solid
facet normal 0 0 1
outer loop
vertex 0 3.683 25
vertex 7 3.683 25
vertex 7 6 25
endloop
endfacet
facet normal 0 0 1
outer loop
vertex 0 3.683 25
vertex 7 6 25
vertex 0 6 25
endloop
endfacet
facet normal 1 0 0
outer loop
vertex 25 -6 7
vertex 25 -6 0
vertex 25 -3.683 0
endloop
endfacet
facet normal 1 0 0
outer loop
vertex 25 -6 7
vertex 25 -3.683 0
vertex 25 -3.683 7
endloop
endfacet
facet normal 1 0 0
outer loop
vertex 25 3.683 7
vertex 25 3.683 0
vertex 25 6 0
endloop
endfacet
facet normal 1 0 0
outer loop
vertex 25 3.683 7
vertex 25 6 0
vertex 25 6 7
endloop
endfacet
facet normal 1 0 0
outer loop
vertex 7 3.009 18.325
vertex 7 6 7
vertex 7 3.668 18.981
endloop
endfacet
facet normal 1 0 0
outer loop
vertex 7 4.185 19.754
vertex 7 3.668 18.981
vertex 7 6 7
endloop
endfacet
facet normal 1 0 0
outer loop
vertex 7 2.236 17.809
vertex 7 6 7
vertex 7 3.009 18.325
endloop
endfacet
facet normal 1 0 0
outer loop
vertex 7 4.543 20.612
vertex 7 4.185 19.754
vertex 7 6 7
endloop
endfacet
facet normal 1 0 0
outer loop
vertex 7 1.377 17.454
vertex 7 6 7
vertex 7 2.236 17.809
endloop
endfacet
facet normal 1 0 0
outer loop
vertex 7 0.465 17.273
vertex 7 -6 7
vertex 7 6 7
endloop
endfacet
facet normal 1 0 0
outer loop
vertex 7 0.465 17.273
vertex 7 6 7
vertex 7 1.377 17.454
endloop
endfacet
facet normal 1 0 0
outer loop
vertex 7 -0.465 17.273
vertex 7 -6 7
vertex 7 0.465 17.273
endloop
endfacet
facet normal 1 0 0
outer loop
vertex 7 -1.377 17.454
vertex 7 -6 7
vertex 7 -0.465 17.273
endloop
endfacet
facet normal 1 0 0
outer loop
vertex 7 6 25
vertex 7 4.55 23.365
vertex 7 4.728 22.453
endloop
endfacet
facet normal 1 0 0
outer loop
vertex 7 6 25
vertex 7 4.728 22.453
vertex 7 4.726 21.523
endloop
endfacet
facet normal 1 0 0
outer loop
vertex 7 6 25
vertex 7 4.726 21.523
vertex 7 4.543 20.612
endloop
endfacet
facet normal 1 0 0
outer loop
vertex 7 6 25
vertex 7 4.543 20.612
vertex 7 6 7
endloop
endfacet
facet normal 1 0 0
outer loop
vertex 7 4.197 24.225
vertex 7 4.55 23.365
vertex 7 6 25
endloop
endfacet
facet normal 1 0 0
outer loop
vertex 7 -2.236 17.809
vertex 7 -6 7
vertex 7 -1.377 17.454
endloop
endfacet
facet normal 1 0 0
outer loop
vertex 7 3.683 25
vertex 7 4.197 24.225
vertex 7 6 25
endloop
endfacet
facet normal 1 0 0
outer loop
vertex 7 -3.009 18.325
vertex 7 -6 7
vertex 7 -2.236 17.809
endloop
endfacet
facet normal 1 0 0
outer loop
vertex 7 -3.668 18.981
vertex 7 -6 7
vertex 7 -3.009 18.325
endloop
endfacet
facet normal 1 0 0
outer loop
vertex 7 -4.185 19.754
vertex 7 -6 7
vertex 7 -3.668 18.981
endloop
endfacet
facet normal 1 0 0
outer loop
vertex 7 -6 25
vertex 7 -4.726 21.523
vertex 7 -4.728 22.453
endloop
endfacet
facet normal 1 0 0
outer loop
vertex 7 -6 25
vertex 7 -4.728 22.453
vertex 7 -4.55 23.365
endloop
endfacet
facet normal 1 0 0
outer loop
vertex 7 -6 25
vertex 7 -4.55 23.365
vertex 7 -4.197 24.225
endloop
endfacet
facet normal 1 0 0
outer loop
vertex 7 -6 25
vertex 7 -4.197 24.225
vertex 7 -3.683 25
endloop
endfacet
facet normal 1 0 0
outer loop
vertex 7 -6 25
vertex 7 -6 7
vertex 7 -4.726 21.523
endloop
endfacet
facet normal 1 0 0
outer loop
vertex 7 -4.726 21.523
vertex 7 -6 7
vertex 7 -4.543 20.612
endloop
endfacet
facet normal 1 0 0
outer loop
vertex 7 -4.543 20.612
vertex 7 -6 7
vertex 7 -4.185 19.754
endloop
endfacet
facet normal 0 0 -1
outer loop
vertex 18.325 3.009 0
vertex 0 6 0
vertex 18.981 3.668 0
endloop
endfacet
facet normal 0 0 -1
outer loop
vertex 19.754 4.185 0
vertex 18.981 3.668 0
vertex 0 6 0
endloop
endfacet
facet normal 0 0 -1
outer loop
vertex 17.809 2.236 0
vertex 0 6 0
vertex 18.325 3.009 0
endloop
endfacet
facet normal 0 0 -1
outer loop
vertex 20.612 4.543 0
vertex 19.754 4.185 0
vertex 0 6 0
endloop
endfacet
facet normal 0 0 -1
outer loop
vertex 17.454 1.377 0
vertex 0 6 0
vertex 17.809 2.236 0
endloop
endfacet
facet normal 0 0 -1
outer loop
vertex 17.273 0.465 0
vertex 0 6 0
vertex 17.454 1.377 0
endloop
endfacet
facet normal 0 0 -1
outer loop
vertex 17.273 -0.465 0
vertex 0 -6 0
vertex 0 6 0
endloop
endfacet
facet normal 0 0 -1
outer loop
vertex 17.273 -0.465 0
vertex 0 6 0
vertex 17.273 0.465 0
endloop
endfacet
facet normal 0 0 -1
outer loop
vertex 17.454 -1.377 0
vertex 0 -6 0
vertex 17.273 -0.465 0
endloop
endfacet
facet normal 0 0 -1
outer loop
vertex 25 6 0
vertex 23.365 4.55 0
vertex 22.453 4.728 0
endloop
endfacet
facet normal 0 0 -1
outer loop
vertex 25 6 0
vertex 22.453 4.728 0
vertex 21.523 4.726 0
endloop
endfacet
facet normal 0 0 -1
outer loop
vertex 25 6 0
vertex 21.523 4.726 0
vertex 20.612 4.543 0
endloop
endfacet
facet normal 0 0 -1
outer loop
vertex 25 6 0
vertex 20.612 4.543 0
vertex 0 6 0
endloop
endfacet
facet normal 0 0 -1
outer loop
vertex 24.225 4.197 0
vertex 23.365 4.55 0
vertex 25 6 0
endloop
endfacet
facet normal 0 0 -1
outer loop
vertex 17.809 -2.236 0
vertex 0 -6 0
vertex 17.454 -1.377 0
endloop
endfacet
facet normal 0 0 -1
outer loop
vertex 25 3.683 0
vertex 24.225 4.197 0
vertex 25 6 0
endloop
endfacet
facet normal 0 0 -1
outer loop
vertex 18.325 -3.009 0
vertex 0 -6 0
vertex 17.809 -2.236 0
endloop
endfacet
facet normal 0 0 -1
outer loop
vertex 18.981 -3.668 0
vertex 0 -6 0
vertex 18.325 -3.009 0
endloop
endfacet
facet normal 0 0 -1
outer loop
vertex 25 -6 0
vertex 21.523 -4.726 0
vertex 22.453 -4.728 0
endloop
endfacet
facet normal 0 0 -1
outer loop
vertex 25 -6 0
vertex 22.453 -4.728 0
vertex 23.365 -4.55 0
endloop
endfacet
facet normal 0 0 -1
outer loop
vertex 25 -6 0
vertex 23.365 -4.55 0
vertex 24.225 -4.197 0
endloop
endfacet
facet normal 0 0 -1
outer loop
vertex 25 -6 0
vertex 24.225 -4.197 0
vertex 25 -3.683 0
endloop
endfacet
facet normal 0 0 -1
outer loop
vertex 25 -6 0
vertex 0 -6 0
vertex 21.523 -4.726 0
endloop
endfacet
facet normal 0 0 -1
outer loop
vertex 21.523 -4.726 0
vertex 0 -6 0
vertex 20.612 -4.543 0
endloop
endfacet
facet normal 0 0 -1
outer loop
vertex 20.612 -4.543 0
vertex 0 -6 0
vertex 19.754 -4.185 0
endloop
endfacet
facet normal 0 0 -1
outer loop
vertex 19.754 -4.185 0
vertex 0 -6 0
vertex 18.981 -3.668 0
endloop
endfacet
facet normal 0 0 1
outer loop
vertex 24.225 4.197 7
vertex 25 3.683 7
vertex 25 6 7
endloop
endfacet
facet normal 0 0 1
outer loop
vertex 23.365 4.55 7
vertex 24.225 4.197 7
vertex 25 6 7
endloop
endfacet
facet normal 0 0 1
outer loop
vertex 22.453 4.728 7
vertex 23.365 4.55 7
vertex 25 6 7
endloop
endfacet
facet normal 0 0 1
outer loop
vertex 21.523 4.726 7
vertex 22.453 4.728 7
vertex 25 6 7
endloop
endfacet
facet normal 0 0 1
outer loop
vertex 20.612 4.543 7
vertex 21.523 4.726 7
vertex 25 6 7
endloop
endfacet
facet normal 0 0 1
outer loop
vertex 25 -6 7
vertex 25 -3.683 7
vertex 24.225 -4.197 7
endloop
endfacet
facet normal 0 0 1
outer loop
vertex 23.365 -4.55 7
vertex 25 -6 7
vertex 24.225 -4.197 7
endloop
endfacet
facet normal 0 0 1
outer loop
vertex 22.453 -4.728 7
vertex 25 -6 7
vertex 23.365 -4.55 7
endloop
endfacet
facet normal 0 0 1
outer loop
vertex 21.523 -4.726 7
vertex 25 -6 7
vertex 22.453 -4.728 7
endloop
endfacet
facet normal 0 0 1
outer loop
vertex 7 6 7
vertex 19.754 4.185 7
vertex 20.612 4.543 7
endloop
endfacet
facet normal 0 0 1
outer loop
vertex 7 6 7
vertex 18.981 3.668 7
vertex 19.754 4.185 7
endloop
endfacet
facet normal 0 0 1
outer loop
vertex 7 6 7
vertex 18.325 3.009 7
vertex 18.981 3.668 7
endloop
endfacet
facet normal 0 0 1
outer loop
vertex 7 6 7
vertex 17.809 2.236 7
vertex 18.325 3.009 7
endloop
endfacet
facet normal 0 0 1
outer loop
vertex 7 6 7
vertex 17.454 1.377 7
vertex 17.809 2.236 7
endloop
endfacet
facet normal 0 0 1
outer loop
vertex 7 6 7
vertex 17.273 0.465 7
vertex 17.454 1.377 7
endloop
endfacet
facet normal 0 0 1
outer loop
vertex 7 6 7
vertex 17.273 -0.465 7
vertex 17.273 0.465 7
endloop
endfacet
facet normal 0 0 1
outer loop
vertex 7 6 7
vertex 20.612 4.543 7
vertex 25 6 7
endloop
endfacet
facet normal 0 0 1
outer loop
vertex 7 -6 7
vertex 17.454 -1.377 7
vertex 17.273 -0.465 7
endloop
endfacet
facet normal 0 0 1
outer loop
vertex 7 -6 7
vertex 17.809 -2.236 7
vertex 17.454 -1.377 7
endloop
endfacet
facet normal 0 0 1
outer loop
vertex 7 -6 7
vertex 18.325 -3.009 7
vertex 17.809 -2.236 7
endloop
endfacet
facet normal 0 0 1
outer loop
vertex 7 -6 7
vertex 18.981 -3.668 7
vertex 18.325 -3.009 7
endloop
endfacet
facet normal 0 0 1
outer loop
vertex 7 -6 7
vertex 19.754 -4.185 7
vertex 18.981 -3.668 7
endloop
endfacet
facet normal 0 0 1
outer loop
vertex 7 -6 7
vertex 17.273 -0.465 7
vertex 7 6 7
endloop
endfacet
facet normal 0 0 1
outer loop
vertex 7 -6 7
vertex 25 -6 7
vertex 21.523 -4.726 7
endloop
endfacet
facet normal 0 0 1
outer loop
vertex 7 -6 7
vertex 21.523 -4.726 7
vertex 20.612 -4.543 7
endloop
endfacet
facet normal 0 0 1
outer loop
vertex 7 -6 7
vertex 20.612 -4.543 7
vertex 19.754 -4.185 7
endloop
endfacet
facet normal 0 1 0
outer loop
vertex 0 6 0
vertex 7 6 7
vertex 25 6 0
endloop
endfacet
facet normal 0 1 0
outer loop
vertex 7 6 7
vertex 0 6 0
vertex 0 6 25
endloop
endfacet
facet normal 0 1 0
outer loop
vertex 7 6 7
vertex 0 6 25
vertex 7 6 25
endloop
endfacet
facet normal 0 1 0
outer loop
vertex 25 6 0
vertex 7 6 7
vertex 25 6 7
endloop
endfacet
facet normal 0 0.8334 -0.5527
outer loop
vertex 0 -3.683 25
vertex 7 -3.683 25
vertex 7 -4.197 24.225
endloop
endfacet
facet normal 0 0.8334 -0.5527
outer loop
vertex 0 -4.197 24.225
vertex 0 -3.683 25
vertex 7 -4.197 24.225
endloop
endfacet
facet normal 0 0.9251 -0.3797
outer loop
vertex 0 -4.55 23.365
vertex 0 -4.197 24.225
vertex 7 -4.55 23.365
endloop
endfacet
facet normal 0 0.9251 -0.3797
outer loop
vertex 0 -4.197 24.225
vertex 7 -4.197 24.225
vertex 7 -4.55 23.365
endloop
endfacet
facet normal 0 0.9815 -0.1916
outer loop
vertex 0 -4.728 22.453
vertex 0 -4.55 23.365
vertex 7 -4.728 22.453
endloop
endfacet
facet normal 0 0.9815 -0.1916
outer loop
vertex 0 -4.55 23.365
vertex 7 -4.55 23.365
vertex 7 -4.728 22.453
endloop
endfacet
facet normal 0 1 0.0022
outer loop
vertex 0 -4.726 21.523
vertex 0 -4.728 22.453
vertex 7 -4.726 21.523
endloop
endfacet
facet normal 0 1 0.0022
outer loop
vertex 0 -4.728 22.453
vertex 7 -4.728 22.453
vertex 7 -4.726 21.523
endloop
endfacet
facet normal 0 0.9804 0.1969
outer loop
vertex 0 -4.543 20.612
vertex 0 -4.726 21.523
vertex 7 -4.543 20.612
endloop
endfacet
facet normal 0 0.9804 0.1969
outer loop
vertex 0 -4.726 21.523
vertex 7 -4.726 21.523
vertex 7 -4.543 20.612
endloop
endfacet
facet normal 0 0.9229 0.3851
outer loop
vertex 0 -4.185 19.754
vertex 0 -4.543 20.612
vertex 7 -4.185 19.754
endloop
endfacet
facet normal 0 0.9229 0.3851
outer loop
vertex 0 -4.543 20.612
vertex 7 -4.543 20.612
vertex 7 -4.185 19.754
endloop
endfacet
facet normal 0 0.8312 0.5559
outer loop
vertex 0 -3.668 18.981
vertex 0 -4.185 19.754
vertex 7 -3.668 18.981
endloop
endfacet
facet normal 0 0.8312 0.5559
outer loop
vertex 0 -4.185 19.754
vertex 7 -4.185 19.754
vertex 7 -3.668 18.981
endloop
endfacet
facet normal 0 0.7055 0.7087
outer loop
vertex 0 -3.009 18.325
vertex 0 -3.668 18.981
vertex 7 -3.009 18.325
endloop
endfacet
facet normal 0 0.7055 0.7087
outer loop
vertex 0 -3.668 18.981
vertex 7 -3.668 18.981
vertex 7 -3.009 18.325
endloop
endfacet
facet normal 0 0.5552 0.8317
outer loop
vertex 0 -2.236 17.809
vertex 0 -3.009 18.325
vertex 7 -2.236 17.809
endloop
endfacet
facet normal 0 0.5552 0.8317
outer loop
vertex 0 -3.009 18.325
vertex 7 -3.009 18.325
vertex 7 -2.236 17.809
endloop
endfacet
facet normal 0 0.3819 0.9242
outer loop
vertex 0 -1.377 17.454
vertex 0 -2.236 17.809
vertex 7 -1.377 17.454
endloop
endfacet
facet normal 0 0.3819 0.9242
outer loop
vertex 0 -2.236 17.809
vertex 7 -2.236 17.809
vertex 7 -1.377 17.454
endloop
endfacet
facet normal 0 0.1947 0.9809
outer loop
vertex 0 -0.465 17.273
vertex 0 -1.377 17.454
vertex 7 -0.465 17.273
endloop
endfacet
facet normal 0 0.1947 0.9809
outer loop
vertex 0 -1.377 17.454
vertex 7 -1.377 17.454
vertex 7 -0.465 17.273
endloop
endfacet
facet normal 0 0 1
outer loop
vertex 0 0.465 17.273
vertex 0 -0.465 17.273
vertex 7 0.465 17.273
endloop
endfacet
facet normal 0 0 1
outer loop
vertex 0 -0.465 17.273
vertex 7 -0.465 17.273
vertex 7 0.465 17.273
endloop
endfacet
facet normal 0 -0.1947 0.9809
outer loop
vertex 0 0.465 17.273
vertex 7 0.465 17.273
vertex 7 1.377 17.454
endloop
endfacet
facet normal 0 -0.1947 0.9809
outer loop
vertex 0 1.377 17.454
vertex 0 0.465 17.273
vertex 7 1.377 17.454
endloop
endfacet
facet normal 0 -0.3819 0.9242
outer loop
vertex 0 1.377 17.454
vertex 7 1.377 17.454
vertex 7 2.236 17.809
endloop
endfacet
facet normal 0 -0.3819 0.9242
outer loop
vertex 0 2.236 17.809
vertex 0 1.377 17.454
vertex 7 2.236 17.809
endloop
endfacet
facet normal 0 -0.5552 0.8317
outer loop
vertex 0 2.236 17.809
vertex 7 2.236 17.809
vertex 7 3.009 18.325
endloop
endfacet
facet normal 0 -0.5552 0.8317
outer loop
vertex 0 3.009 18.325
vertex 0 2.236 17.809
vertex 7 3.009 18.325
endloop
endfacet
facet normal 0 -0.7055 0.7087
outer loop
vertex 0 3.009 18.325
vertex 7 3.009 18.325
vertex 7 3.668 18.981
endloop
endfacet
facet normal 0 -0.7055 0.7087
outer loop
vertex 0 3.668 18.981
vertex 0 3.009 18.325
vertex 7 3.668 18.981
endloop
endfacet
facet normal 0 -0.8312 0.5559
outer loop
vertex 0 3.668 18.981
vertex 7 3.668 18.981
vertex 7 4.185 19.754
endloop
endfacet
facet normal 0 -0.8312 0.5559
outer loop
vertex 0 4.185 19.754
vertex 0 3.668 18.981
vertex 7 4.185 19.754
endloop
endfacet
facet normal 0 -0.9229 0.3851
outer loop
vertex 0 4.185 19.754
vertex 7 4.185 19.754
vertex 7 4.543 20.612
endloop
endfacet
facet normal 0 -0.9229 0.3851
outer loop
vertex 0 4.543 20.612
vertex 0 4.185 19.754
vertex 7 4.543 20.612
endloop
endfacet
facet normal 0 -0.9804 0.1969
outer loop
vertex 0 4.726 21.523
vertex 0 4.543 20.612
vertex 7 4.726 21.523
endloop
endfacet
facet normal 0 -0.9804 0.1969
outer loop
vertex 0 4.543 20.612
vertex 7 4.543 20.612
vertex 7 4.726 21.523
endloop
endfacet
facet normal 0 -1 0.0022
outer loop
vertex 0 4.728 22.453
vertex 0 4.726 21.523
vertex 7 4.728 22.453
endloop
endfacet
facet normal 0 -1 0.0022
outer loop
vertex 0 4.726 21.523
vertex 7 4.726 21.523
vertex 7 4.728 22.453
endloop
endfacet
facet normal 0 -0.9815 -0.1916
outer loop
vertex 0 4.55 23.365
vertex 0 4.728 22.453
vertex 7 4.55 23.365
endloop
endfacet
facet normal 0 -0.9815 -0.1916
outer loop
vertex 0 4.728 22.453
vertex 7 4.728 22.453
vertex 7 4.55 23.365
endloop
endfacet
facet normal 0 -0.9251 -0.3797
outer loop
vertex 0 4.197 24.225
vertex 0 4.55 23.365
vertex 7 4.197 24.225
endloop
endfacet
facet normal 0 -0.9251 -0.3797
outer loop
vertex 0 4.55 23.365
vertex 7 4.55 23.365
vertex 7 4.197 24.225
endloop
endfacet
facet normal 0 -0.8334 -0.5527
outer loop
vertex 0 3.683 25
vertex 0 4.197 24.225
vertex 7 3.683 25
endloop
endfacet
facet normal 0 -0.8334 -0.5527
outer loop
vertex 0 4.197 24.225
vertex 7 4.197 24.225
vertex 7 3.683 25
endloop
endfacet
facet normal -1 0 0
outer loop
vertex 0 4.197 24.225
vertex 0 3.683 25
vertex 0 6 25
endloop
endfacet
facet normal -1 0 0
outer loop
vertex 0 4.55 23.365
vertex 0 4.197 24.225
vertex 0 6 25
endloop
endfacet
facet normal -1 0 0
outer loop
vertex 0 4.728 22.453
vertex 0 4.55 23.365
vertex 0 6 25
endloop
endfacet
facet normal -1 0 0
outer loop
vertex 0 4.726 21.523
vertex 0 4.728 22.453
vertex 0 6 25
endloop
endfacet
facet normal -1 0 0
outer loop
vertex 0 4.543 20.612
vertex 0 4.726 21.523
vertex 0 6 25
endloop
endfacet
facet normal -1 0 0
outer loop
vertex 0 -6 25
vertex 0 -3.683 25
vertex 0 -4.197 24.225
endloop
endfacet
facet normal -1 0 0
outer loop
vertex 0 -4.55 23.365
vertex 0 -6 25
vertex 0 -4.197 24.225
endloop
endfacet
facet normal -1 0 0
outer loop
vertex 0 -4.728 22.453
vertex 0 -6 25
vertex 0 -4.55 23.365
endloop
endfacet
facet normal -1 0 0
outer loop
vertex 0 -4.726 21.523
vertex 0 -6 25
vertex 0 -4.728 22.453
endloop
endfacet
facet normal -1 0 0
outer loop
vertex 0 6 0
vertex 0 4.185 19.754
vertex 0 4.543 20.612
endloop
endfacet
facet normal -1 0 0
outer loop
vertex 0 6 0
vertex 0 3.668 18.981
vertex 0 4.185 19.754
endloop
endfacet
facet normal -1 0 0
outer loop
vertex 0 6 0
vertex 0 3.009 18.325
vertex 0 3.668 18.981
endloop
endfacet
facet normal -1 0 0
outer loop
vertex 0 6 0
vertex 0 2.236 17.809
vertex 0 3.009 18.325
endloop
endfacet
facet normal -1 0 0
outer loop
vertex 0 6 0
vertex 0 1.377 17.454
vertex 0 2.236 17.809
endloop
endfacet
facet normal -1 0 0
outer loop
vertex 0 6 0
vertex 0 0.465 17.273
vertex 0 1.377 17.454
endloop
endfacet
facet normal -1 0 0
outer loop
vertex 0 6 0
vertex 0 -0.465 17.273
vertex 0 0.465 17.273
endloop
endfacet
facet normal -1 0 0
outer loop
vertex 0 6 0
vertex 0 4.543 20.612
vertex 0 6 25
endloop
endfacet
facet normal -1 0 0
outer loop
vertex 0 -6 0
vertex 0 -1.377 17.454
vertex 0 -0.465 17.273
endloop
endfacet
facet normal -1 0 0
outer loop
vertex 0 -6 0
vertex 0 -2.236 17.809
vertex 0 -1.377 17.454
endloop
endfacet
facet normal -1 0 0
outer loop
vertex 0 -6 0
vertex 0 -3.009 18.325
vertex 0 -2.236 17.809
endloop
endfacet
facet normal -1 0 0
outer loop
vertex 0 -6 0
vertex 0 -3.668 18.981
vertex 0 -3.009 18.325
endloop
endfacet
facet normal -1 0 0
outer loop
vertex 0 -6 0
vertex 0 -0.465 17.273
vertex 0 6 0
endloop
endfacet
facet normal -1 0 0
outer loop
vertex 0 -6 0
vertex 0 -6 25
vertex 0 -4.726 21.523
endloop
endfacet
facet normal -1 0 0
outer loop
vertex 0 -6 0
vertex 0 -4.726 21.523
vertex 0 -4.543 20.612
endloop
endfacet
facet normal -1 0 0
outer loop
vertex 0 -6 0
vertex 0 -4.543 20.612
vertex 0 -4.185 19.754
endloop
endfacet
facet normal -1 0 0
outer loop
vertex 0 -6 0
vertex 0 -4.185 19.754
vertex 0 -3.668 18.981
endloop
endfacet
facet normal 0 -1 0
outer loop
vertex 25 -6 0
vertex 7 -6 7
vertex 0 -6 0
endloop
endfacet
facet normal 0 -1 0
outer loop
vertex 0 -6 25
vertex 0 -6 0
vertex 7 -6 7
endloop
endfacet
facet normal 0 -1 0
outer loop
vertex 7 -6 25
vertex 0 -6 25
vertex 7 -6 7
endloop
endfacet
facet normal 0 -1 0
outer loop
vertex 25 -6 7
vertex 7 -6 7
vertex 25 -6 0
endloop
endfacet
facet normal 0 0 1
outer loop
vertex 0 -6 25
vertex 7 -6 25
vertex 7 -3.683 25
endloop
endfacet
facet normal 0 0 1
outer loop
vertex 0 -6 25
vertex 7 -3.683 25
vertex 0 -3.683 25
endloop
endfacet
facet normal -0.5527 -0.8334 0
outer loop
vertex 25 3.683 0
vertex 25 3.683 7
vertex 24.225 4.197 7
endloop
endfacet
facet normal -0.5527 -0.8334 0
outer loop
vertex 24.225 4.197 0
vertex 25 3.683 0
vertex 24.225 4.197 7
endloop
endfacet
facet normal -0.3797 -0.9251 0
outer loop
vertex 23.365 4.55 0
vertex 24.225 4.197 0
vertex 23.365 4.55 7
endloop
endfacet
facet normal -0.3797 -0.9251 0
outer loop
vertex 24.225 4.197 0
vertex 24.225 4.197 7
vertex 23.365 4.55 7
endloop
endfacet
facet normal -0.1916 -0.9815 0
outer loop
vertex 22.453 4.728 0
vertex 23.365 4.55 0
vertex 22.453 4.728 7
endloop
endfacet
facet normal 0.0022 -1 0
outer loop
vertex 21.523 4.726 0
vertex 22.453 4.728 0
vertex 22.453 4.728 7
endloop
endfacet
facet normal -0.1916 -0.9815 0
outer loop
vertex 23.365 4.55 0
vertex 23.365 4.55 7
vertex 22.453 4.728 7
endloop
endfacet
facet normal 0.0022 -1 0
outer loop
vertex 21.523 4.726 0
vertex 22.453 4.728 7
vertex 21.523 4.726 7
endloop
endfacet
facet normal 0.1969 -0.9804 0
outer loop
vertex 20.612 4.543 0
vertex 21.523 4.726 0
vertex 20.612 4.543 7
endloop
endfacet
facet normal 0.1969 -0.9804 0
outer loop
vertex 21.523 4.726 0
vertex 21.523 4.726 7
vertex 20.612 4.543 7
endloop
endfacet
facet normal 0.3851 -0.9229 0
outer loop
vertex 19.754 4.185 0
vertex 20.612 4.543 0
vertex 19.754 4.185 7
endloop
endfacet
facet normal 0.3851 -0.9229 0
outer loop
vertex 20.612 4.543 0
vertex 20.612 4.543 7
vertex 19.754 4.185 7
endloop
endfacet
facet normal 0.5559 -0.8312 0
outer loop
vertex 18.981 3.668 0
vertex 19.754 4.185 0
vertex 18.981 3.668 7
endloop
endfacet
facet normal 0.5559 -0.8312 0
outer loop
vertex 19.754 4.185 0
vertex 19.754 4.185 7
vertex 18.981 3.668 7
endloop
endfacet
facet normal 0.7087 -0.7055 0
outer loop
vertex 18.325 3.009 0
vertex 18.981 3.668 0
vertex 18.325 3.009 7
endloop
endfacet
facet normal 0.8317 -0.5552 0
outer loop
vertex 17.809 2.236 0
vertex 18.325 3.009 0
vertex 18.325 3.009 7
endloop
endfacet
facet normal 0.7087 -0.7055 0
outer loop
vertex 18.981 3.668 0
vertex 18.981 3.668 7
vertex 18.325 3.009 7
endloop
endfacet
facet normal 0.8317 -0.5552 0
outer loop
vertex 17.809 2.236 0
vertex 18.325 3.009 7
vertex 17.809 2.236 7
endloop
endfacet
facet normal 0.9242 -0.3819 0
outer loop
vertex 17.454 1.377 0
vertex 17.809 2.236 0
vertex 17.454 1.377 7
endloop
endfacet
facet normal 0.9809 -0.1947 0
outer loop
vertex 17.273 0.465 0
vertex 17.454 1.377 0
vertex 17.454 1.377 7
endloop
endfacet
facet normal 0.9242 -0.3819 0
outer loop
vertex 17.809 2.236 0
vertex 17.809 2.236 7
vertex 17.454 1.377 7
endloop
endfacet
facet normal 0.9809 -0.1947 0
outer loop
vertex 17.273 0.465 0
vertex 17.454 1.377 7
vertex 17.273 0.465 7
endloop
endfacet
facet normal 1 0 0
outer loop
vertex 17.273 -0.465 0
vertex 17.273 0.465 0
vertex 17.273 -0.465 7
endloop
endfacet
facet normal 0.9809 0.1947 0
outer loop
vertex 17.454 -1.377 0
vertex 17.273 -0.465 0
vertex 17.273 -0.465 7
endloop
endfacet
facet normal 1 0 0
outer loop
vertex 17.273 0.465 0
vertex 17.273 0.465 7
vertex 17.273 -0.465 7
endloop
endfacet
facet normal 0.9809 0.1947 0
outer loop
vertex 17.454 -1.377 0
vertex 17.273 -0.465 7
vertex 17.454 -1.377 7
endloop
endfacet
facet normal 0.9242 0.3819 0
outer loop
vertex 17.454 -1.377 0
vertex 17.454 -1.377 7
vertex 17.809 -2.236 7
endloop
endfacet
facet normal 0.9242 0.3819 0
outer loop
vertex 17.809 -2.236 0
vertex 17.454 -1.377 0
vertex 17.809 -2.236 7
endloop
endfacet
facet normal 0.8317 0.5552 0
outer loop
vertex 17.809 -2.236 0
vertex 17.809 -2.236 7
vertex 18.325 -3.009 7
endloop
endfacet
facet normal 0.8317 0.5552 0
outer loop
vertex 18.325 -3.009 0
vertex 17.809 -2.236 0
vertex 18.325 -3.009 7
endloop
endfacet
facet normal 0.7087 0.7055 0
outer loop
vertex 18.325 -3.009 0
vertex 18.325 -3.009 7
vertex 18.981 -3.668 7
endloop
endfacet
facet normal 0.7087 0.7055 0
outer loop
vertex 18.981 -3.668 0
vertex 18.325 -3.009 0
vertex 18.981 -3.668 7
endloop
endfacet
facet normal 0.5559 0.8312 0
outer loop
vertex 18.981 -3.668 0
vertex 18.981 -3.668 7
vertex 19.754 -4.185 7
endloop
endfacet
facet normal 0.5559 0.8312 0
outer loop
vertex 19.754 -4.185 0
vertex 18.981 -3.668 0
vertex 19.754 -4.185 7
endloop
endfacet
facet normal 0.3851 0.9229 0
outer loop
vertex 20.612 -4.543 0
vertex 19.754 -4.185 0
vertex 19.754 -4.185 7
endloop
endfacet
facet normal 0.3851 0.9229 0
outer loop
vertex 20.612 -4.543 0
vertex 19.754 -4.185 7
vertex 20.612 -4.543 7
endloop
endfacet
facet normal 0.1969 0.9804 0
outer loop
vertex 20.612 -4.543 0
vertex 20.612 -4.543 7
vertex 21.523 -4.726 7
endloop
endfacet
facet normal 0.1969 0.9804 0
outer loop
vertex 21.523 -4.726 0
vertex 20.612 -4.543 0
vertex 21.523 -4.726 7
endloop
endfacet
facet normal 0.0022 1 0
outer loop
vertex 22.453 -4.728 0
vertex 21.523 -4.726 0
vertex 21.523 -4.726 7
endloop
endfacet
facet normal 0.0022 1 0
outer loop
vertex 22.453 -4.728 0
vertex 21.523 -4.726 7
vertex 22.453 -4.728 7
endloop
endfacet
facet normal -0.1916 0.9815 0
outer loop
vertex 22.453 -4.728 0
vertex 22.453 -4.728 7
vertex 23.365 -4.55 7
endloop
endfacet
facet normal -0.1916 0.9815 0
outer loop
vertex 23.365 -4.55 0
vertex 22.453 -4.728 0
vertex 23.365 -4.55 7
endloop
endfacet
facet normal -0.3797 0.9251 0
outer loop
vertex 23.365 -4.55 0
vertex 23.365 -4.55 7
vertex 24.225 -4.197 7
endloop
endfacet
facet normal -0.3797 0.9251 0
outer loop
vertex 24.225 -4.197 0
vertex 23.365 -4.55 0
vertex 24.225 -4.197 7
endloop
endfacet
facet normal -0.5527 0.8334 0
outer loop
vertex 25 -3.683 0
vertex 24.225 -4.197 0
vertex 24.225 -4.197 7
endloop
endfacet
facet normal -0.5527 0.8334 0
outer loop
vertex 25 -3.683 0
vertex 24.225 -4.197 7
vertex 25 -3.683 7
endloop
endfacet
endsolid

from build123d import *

# Parameters (mm, degrees)
F1_DEPTH = 6
F3_DEPTH = 7.001
F4_R     = 4.75
F5_DEPTH = 25


with BuildPart() as f1:
    # F0 (on Front) → F1 (new body, symmetric)
    with BuildSketch(Plane.XZ):
        Polygon((7, 25), (0, 25), (0, 0), (25, 0), (25, 7), (7, 7), align=None)
    extrude(amount=F1_DEPTH, both=True)

    # F2 (on face) → F3 (cut, through all)
    with BuildSketch(Plane.XY.offset(7)):
        with BuildLine():
            ThreePointArc((25, -3.68273), (26.290251, -2.038688), (26.75, 0))
            ThreePointArc((26.75, 0), (26.290251, 2.038688), (25, 3.68273))
            Line((25, 3.68273), (25, -3.68273))
        make_face()
        with BuildLine():
            Line((25, -3.68273), (25, 3.68273))
            ThreePointArc((25, 3.68273), (17.25, 0), (25, -3.68273))
        make_face()
    extrude(amount=-F3_DEPTH, mode=Mode.SUBTRACT)

    # F4 (on face) → F5 (cut)
    with BuildSketch(Plane.YZ.offset(7)):
        with Locations((0, 22)):
            Circle(F4_R)
    extrude(amount=-F5_DEPTH, mode=Mode.SUBTRACT)


solid = f1.part
